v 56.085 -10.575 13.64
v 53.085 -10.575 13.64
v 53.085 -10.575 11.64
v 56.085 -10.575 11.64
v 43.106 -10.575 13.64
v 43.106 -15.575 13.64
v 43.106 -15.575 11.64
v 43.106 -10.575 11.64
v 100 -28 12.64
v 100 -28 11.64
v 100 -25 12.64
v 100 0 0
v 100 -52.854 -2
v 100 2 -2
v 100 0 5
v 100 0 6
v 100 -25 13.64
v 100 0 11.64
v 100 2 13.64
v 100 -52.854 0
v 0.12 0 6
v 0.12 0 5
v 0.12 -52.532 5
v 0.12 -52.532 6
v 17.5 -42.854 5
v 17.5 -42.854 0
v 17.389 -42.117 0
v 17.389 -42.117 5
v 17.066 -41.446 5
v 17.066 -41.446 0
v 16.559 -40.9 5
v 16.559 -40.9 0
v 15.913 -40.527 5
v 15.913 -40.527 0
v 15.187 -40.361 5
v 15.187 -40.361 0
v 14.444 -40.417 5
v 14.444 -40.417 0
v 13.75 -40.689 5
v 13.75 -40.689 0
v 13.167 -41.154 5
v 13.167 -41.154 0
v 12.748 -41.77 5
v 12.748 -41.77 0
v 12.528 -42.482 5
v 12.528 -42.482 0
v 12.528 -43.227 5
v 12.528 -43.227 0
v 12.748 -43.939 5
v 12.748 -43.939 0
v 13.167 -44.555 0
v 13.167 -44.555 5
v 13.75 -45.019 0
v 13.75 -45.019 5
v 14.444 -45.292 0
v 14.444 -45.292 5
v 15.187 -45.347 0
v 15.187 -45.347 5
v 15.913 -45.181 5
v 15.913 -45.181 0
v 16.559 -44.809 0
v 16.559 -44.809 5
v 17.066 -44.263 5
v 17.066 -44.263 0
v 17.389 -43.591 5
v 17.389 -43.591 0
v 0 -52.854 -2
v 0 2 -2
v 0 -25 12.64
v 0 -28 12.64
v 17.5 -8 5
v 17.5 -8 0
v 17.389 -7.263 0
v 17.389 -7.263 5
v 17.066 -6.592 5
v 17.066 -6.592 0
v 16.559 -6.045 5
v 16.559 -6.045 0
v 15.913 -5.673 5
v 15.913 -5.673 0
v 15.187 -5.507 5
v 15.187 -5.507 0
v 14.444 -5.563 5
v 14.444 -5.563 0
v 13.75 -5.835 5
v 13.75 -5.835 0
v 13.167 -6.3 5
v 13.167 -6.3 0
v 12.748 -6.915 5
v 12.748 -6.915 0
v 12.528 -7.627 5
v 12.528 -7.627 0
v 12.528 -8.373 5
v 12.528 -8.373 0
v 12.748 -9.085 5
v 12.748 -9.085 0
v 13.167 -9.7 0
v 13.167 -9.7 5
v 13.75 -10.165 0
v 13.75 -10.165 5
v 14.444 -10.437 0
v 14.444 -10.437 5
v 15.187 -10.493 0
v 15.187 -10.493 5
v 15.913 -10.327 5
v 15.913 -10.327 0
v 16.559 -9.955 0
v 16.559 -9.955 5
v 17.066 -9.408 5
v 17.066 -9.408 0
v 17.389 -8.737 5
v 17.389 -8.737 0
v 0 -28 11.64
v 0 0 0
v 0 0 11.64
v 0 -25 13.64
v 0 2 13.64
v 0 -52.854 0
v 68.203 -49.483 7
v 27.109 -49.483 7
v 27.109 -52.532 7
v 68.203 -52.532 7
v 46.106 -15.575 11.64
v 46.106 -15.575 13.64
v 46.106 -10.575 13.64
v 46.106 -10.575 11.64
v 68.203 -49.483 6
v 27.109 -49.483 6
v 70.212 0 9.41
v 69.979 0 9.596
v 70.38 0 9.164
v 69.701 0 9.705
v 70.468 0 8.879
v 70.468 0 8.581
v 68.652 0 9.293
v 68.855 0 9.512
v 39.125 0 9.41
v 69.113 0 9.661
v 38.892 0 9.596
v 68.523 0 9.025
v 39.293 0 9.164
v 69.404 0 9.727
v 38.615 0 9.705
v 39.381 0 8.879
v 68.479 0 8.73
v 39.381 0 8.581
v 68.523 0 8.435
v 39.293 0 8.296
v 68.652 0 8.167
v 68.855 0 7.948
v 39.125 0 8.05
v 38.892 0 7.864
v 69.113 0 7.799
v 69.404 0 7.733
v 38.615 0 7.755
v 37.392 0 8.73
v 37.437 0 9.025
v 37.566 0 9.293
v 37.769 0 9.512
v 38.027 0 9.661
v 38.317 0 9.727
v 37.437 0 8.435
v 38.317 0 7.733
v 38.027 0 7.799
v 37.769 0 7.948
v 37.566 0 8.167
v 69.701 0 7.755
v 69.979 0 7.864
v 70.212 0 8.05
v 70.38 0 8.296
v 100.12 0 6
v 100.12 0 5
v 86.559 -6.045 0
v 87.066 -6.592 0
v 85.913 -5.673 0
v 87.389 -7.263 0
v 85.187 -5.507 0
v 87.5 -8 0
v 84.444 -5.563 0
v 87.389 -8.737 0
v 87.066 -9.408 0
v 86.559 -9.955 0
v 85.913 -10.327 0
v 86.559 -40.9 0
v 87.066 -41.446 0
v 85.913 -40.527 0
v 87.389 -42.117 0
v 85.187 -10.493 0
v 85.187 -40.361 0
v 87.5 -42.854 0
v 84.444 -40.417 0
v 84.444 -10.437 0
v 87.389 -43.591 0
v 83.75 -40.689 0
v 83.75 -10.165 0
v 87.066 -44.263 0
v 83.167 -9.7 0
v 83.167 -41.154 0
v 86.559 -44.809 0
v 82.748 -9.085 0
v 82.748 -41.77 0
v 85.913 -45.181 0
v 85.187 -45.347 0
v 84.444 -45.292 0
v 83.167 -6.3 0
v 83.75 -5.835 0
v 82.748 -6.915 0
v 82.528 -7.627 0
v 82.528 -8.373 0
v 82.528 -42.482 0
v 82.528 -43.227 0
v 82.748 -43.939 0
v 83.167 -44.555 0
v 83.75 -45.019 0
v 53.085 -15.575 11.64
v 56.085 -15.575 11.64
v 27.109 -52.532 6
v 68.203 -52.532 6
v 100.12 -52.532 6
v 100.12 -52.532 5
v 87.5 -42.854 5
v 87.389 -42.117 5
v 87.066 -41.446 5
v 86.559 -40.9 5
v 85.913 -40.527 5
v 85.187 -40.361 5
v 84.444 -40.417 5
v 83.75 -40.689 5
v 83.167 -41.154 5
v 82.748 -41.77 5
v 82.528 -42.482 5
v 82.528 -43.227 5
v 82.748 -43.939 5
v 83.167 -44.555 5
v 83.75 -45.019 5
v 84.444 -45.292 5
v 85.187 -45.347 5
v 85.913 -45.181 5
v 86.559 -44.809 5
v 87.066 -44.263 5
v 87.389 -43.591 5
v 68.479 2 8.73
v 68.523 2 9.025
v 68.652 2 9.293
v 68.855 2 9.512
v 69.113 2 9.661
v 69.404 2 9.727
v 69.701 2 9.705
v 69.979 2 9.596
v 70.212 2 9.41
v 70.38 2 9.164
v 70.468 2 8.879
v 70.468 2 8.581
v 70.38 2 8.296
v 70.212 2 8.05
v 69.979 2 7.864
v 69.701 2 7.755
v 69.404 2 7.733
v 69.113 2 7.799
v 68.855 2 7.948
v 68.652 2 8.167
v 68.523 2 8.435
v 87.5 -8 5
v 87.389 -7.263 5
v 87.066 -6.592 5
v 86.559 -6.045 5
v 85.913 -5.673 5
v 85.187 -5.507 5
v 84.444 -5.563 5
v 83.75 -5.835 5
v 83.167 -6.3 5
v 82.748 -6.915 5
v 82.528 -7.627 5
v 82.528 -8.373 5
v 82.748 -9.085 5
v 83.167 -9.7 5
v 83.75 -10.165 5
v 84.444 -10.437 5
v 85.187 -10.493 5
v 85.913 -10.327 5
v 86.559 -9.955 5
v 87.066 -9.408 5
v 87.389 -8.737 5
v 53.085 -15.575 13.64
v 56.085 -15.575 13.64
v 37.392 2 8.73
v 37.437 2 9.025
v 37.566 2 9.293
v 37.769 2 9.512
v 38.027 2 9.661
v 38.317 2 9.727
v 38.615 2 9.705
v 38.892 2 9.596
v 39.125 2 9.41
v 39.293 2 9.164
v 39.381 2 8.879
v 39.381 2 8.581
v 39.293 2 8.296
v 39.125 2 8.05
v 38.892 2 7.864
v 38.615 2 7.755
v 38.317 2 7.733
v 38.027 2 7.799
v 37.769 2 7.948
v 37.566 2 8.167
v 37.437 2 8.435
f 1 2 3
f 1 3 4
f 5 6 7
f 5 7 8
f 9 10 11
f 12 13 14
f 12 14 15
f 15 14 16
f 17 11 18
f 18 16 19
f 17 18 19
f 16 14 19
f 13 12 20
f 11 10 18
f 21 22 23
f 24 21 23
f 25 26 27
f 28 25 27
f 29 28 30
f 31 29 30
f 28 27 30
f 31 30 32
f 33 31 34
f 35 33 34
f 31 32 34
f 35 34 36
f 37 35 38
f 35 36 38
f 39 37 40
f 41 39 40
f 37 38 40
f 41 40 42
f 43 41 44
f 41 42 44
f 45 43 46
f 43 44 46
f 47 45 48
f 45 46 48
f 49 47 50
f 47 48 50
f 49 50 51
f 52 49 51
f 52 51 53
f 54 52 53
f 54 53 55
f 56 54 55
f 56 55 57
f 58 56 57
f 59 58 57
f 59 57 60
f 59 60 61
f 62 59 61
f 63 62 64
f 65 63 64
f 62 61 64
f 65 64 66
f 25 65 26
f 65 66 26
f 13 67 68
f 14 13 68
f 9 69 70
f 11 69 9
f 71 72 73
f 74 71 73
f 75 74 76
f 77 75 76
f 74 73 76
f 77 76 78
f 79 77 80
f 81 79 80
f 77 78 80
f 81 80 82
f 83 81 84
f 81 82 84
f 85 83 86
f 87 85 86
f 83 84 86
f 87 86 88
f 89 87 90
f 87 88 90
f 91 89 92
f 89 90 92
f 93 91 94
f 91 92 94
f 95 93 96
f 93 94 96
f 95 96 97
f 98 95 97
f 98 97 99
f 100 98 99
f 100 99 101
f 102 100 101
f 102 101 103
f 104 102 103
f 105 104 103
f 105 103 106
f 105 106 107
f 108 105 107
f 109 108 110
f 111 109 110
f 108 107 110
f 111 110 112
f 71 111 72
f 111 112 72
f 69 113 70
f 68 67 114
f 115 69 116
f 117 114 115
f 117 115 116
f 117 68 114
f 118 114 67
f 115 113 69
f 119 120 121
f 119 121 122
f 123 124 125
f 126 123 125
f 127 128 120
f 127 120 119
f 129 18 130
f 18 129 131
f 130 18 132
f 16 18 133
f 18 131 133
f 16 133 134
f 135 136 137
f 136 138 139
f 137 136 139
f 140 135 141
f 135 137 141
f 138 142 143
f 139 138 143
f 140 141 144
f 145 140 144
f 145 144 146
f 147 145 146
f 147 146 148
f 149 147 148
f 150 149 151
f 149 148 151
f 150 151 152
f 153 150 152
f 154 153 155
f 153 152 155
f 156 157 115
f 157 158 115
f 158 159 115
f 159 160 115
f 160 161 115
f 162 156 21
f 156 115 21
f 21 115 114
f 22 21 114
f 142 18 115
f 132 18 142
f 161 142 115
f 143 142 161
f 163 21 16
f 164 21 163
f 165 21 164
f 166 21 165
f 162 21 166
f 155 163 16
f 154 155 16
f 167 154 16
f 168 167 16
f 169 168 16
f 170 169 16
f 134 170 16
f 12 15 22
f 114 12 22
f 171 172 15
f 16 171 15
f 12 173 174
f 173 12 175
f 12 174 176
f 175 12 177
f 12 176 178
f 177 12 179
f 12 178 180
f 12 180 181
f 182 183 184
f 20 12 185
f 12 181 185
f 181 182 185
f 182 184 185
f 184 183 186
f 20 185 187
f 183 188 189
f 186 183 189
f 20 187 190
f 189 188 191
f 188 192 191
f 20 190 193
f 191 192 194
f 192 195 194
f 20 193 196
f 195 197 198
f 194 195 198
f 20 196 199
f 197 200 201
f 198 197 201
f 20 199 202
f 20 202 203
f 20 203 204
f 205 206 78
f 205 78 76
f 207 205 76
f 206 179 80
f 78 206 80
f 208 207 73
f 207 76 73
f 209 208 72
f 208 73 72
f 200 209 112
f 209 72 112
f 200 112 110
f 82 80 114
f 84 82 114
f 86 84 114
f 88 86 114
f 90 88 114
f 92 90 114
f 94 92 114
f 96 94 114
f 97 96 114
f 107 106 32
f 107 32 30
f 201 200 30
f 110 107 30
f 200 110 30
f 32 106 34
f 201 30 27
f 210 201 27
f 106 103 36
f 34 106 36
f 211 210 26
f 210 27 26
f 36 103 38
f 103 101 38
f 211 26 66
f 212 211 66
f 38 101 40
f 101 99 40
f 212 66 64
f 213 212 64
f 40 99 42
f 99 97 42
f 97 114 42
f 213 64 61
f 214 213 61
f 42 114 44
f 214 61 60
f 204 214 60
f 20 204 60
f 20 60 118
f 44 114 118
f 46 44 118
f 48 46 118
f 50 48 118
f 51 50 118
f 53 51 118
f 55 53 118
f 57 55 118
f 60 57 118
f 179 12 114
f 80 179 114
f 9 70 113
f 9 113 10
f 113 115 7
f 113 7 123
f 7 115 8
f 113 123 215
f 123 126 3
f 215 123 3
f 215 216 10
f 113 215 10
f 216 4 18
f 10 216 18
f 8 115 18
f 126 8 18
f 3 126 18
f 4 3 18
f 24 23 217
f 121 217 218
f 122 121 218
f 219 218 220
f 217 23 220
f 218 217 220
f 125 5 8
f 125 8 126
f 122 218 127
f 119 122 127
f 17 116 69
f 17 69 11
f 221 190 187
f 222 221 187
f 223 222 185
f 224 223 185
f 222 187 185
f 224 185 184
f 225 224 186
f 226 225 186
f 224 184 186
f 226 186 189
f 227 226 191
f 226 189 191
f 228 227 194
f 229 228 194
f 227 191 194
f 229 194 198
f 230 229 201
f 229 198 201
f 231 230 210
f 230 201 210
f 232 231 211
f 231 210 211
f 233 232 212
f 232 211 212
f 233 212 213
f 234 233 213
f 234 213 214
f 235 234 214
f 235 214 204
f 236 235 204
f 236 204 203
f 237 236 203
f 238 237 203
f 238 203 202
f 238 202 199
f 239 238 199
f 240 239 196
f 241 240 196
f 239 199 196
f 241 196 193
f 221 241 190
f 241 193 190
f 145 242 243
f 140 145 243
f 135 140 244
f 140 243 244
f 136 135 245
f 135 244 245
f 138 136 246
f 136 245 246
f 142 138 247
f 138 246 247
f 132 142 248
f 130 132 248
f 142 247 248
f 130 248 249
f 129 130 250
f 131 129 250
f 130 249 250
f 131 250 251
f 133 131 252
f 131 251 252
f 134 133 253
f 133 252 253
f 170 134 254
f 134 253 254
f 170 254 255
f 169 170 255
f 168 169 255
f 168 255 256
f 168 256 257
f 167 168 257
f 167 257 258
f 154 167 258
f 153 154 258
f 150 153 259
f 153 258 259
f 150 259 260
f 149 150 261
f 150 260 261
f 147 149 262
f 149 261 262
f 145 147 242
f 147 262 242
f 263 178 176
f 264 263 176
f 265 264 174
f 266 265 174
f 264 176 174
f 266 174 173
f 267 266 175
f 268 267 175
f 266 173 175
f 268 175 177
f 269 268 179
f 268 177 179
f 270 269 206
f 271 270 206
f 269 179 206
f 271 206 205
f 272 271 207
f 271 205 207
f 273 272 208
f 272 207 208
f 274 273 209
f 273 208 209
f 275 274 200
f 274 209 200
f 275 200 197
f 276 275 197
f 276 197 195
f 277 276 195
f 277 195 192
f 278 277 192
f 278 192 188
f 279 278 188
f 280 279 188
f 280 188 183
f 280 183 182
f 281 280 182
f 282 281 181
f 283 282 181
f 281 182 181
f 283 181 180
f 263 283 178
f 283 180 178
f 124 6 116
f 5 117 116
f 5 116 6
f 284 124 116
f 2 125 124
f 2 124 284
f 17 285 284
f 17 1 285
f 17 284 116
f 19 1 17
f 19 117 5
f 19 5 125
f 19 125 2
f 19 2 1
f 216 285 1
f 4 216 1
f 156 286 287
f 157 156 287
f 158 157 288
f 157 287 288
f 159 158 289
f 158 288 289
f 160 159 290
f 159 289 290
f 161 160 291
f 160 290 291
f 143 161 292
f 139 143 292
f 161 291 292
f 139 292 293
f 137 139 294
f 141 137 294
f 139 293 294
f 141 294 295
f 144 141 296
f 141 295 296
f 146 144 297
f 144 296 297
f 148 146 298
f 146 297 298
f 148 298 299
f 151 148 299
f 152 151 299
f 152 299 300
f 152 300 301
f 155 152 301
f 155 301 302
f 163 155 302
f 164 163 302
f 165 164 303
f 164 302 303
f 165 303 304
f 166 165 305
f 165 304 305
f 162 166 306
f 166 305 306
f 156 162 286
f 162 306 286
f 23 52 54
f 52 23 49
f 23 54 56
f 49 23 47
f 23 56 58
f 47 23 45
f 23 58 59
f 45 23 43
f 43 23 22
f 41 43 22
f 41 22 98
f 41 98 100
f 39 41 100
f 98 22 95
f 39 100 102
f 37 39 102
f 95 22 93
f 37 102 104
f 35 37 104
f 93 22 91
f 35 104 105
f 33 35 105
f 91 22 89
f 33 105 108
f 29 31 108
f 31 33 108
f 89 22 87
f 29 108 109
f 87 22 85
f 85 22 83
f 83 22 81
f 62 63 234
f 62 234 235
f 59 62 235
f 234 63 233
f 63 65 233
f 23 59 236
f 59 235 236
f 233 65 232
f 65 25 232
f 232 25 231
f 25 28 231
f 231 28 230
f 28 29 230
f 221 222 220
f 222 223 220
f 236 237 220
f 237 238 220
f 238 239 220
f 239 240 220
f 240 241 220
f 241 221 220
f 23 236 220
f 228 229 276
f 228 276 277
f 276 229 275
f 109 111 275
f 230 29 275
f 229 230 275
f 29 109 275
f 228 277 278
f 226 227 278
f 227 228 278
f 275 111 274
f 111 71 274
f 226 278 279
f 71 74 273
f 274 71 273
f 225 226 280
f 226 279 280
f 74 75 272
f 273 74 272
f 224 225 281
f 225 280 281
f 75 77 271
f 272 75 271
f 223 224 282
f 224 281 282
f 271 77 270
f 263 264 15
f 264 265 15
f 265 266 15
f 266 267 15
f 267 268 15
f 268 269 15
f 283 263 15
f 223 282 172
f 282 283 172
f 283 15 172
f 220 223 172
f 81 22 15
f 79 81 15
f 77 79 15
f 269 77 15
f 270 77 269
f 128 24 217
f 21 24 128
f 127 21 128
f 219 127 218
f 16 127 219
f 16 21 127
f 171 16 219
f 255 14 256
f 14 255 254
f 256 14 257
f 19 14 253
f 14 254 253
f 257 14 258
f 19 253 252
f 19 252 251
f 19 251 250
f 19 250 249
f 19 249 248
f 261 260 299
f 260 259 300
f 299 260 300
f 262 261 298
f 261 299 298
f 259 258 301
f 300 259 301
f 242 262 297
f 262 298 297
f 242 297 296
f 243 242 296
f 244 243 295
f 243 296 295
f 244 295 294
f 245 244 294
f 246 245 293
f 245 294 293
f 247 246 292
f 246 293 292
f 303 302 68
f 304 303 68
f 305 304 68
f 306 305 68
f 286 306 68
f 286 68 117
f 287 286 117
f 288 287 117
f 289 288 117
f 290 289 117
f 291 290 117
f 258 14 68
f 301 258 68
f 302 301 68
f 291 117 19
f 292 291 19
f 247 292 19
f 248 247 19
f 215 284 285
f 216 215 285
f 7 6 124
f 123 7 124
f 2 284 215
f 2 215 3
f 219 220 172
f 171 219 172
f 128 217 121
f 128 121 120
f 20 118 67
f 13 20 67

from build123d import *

# Parameters (mm, degrees)
F1_DEPTH  = 100
F2_W      = 100
F2_H      = 2
F3_DEPTH  = 25
F4_R      = 2.5
F5_DEPTH  = 5
F6_DEPTH  = 5
F7_W      = 3
F7_H      = 5
F8_DEPTH  = 2
F9_W      = 100
F9_H      = 1
F10_DEPTH = 3
F11_R     = 1
F12_DEPTH = 2
F13_W     = 41.0935450345
F13_H     = 3.0485875905
F14_DEPTH = 1
F15_DEPTH = 2


with BuildPart() as f1:
    # F0 (on Right) → F1 (new body)
    with BuildSketch(Plane.YZ):
        Polygon((0, 0), (-52.8542138636, 0), (-52.8542138636, -2), (2, -2), (2, 13.6397993192), (0, 13.6397993192), align=None)
    extrude(amount=F1_DEPTH)

    # F2 (on face) → F3 (join)
    with BuildSketch(Plane.XZ):
        with Locations((50, 12.6397993192)):
            Rectangle(F2_W, F2_H)
    extrude(amount=F3_DEPTH)

    # F4 (on face) → F5 (join)
    with BuildSketch(Plane.XY):
        with Locations((15, -42.8542138636)):
            Circle(F4_R)
    extrude(amount=F5_DEPTH)

    # F4 (on face) → F6 (join)
    with BuildSketch(Plane.XY):
        with Locations((15, -42.8542138636)):
            Circle(F4_R)
        with Locations((85, -42.8542138636)):
            Circle(F4_R)
        with Locations((15, -8)):
            Circle(F4_R)
        with Locations((85, -8)):
            Circle(F4_R)
    extrude(amount=F6_DEPTH)

    # F7 (on face) → F8 (cut, through all)
    with BuildSketch(Plane.XY.offset(13.6397993192)):
        with Locations((54.5849918723, -13.0749022961)):
            Rectangle(F7_W, F7_H)
        with Locations((44.6058220565, -13.0749022961)):
            Rectangle(F7_W, F7_H)
    extrude(amount=-F8_DEPTH, mode=Mode.SUBTRACT)

    # F9 (on face) → F10 (join)
    with BuildSketch(Plane.XZ.offset(25)):
        with Locations((50, 12.1397993192)):
            Rectangle(F9_W, F9_H)
    extrude(amount=F10_DEPTH)

    # F11 (on face) → F12 (cut, through all)
    with BuildSketch(Plane(origin=(0, 2, 0), x_dir=(-1, 0, 0), z_dir=(0, 1, 0))):
        with Locations((-69.4787353277, 8.7301367894)):
            Circle(F11_R)
        with Locations((-38.3921302855, 8.7301367894)):
            Circle(F11_R)
    extrude(amount=-F12_DEPTH, mode=Mode.SUBTRACT)

    # F13 (on face) → F14 (join)
    with BuildSketch(Plane.XY.offset(5)):
        Polygon((0.119697972, 0), (0.119697972, -52.5318421423), (27.1094348282, -52.5318421423), (27.1094348282, -49.4832545519), (68.2029798627, -49.4832545519), (68.2029798627, -52.5318421423), (100.119697972, -52.5318421423), (100.119697972, 0), align=None)
        with Locations((47.6562073454, -51.0075483471)):
            Rectangle(F13_W, F13_H)
    extrude(amount=F14_DEPTH)

    # F13 (on face) → F15 (join)
    with BuildSketch(Plane.XY.offset(5)):
        with Locations((47.6562073454, -51.0075483471)):
            Rectangle(F13_W, F13_H)
    extrude(amount=F15_DEPTH)


solid = f1.part
